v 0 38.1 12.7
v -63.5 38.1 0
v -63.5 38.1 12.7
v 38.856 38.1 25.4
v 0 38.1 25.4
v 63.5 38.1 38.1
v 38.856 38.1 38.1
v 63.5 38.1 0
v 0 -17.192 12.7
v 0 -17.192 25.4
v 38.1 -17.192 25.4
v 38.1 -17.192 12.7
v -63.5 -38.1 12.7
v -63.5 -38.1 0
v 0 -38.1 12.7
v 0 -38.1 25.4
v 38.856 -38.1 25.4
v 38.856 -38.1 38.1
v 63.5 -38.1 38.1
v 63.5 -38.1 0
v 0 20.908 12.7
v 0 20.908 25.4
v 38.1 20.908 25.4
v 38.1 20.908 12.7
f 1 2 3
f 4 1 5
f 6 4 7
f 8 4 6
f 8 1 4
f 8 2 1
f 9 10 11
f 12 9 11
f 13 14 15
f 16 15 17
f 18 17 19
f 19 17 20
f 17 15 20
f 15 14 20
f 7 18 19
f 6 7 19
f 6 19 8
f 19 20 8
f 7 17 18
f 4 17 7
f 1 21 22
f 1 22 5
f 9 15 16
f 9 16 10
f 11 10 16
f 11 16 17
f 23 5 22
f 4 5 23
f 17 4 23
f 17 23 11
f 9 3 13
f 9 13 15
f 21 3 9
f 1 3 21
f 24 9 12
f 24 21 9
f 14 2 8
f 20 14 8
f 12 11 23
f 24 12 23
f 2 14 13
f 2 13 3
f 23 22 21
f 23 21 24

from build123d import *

# Parameters (mm, degrees)
F0_W     = 127
F0_H     = 76.2
F1_DEPTH = 12.7
F2_W     = 63.5
F2_H     = 76.2
F3_DEPTH = 12.7
F4_W     = 38.1
F4_H     = 38.1
F5_DEPTH = 12.7
F6_W     = 24.64416
F6_H     = 76.2
F7_DEPTH = 12.7


with BuildPart() as f1:
    # F0 (on Top) → F1 (new body)
    with BuildSketch(Plane.XY):
        Rectangle(F0_W, F0_H)
    extrude(amount=F1_DEPTH)

    # F2 (on face) → F3 (join)
    with BuildSketch(Plane.XY.offset(12.7)):
        with Locations((31.75, 0)):
            Rectangle(F2_W, F2_H)
    extrude(amount=F3_DEPTH)

    # F4 (on face) → F5 (cut)
    with BuildSketch(Plane.XY.offset(25.4)):
        with Locations((19.05, 1.858458)):
            Rectangle(F4_W, F4_H)
    extrude(amount=-F5_DEPTH, mode=Mode.SUBTRACT)

    # F6 (on face) → F7 (join)
    with BuildSketch(Plane.XY.offset(25.4)):
        with Locations((51.17792, 0)):
            Rectangle(F6_W, F6_H)
    extrude(amount=F7_DEPTH)


solid = f1.part
